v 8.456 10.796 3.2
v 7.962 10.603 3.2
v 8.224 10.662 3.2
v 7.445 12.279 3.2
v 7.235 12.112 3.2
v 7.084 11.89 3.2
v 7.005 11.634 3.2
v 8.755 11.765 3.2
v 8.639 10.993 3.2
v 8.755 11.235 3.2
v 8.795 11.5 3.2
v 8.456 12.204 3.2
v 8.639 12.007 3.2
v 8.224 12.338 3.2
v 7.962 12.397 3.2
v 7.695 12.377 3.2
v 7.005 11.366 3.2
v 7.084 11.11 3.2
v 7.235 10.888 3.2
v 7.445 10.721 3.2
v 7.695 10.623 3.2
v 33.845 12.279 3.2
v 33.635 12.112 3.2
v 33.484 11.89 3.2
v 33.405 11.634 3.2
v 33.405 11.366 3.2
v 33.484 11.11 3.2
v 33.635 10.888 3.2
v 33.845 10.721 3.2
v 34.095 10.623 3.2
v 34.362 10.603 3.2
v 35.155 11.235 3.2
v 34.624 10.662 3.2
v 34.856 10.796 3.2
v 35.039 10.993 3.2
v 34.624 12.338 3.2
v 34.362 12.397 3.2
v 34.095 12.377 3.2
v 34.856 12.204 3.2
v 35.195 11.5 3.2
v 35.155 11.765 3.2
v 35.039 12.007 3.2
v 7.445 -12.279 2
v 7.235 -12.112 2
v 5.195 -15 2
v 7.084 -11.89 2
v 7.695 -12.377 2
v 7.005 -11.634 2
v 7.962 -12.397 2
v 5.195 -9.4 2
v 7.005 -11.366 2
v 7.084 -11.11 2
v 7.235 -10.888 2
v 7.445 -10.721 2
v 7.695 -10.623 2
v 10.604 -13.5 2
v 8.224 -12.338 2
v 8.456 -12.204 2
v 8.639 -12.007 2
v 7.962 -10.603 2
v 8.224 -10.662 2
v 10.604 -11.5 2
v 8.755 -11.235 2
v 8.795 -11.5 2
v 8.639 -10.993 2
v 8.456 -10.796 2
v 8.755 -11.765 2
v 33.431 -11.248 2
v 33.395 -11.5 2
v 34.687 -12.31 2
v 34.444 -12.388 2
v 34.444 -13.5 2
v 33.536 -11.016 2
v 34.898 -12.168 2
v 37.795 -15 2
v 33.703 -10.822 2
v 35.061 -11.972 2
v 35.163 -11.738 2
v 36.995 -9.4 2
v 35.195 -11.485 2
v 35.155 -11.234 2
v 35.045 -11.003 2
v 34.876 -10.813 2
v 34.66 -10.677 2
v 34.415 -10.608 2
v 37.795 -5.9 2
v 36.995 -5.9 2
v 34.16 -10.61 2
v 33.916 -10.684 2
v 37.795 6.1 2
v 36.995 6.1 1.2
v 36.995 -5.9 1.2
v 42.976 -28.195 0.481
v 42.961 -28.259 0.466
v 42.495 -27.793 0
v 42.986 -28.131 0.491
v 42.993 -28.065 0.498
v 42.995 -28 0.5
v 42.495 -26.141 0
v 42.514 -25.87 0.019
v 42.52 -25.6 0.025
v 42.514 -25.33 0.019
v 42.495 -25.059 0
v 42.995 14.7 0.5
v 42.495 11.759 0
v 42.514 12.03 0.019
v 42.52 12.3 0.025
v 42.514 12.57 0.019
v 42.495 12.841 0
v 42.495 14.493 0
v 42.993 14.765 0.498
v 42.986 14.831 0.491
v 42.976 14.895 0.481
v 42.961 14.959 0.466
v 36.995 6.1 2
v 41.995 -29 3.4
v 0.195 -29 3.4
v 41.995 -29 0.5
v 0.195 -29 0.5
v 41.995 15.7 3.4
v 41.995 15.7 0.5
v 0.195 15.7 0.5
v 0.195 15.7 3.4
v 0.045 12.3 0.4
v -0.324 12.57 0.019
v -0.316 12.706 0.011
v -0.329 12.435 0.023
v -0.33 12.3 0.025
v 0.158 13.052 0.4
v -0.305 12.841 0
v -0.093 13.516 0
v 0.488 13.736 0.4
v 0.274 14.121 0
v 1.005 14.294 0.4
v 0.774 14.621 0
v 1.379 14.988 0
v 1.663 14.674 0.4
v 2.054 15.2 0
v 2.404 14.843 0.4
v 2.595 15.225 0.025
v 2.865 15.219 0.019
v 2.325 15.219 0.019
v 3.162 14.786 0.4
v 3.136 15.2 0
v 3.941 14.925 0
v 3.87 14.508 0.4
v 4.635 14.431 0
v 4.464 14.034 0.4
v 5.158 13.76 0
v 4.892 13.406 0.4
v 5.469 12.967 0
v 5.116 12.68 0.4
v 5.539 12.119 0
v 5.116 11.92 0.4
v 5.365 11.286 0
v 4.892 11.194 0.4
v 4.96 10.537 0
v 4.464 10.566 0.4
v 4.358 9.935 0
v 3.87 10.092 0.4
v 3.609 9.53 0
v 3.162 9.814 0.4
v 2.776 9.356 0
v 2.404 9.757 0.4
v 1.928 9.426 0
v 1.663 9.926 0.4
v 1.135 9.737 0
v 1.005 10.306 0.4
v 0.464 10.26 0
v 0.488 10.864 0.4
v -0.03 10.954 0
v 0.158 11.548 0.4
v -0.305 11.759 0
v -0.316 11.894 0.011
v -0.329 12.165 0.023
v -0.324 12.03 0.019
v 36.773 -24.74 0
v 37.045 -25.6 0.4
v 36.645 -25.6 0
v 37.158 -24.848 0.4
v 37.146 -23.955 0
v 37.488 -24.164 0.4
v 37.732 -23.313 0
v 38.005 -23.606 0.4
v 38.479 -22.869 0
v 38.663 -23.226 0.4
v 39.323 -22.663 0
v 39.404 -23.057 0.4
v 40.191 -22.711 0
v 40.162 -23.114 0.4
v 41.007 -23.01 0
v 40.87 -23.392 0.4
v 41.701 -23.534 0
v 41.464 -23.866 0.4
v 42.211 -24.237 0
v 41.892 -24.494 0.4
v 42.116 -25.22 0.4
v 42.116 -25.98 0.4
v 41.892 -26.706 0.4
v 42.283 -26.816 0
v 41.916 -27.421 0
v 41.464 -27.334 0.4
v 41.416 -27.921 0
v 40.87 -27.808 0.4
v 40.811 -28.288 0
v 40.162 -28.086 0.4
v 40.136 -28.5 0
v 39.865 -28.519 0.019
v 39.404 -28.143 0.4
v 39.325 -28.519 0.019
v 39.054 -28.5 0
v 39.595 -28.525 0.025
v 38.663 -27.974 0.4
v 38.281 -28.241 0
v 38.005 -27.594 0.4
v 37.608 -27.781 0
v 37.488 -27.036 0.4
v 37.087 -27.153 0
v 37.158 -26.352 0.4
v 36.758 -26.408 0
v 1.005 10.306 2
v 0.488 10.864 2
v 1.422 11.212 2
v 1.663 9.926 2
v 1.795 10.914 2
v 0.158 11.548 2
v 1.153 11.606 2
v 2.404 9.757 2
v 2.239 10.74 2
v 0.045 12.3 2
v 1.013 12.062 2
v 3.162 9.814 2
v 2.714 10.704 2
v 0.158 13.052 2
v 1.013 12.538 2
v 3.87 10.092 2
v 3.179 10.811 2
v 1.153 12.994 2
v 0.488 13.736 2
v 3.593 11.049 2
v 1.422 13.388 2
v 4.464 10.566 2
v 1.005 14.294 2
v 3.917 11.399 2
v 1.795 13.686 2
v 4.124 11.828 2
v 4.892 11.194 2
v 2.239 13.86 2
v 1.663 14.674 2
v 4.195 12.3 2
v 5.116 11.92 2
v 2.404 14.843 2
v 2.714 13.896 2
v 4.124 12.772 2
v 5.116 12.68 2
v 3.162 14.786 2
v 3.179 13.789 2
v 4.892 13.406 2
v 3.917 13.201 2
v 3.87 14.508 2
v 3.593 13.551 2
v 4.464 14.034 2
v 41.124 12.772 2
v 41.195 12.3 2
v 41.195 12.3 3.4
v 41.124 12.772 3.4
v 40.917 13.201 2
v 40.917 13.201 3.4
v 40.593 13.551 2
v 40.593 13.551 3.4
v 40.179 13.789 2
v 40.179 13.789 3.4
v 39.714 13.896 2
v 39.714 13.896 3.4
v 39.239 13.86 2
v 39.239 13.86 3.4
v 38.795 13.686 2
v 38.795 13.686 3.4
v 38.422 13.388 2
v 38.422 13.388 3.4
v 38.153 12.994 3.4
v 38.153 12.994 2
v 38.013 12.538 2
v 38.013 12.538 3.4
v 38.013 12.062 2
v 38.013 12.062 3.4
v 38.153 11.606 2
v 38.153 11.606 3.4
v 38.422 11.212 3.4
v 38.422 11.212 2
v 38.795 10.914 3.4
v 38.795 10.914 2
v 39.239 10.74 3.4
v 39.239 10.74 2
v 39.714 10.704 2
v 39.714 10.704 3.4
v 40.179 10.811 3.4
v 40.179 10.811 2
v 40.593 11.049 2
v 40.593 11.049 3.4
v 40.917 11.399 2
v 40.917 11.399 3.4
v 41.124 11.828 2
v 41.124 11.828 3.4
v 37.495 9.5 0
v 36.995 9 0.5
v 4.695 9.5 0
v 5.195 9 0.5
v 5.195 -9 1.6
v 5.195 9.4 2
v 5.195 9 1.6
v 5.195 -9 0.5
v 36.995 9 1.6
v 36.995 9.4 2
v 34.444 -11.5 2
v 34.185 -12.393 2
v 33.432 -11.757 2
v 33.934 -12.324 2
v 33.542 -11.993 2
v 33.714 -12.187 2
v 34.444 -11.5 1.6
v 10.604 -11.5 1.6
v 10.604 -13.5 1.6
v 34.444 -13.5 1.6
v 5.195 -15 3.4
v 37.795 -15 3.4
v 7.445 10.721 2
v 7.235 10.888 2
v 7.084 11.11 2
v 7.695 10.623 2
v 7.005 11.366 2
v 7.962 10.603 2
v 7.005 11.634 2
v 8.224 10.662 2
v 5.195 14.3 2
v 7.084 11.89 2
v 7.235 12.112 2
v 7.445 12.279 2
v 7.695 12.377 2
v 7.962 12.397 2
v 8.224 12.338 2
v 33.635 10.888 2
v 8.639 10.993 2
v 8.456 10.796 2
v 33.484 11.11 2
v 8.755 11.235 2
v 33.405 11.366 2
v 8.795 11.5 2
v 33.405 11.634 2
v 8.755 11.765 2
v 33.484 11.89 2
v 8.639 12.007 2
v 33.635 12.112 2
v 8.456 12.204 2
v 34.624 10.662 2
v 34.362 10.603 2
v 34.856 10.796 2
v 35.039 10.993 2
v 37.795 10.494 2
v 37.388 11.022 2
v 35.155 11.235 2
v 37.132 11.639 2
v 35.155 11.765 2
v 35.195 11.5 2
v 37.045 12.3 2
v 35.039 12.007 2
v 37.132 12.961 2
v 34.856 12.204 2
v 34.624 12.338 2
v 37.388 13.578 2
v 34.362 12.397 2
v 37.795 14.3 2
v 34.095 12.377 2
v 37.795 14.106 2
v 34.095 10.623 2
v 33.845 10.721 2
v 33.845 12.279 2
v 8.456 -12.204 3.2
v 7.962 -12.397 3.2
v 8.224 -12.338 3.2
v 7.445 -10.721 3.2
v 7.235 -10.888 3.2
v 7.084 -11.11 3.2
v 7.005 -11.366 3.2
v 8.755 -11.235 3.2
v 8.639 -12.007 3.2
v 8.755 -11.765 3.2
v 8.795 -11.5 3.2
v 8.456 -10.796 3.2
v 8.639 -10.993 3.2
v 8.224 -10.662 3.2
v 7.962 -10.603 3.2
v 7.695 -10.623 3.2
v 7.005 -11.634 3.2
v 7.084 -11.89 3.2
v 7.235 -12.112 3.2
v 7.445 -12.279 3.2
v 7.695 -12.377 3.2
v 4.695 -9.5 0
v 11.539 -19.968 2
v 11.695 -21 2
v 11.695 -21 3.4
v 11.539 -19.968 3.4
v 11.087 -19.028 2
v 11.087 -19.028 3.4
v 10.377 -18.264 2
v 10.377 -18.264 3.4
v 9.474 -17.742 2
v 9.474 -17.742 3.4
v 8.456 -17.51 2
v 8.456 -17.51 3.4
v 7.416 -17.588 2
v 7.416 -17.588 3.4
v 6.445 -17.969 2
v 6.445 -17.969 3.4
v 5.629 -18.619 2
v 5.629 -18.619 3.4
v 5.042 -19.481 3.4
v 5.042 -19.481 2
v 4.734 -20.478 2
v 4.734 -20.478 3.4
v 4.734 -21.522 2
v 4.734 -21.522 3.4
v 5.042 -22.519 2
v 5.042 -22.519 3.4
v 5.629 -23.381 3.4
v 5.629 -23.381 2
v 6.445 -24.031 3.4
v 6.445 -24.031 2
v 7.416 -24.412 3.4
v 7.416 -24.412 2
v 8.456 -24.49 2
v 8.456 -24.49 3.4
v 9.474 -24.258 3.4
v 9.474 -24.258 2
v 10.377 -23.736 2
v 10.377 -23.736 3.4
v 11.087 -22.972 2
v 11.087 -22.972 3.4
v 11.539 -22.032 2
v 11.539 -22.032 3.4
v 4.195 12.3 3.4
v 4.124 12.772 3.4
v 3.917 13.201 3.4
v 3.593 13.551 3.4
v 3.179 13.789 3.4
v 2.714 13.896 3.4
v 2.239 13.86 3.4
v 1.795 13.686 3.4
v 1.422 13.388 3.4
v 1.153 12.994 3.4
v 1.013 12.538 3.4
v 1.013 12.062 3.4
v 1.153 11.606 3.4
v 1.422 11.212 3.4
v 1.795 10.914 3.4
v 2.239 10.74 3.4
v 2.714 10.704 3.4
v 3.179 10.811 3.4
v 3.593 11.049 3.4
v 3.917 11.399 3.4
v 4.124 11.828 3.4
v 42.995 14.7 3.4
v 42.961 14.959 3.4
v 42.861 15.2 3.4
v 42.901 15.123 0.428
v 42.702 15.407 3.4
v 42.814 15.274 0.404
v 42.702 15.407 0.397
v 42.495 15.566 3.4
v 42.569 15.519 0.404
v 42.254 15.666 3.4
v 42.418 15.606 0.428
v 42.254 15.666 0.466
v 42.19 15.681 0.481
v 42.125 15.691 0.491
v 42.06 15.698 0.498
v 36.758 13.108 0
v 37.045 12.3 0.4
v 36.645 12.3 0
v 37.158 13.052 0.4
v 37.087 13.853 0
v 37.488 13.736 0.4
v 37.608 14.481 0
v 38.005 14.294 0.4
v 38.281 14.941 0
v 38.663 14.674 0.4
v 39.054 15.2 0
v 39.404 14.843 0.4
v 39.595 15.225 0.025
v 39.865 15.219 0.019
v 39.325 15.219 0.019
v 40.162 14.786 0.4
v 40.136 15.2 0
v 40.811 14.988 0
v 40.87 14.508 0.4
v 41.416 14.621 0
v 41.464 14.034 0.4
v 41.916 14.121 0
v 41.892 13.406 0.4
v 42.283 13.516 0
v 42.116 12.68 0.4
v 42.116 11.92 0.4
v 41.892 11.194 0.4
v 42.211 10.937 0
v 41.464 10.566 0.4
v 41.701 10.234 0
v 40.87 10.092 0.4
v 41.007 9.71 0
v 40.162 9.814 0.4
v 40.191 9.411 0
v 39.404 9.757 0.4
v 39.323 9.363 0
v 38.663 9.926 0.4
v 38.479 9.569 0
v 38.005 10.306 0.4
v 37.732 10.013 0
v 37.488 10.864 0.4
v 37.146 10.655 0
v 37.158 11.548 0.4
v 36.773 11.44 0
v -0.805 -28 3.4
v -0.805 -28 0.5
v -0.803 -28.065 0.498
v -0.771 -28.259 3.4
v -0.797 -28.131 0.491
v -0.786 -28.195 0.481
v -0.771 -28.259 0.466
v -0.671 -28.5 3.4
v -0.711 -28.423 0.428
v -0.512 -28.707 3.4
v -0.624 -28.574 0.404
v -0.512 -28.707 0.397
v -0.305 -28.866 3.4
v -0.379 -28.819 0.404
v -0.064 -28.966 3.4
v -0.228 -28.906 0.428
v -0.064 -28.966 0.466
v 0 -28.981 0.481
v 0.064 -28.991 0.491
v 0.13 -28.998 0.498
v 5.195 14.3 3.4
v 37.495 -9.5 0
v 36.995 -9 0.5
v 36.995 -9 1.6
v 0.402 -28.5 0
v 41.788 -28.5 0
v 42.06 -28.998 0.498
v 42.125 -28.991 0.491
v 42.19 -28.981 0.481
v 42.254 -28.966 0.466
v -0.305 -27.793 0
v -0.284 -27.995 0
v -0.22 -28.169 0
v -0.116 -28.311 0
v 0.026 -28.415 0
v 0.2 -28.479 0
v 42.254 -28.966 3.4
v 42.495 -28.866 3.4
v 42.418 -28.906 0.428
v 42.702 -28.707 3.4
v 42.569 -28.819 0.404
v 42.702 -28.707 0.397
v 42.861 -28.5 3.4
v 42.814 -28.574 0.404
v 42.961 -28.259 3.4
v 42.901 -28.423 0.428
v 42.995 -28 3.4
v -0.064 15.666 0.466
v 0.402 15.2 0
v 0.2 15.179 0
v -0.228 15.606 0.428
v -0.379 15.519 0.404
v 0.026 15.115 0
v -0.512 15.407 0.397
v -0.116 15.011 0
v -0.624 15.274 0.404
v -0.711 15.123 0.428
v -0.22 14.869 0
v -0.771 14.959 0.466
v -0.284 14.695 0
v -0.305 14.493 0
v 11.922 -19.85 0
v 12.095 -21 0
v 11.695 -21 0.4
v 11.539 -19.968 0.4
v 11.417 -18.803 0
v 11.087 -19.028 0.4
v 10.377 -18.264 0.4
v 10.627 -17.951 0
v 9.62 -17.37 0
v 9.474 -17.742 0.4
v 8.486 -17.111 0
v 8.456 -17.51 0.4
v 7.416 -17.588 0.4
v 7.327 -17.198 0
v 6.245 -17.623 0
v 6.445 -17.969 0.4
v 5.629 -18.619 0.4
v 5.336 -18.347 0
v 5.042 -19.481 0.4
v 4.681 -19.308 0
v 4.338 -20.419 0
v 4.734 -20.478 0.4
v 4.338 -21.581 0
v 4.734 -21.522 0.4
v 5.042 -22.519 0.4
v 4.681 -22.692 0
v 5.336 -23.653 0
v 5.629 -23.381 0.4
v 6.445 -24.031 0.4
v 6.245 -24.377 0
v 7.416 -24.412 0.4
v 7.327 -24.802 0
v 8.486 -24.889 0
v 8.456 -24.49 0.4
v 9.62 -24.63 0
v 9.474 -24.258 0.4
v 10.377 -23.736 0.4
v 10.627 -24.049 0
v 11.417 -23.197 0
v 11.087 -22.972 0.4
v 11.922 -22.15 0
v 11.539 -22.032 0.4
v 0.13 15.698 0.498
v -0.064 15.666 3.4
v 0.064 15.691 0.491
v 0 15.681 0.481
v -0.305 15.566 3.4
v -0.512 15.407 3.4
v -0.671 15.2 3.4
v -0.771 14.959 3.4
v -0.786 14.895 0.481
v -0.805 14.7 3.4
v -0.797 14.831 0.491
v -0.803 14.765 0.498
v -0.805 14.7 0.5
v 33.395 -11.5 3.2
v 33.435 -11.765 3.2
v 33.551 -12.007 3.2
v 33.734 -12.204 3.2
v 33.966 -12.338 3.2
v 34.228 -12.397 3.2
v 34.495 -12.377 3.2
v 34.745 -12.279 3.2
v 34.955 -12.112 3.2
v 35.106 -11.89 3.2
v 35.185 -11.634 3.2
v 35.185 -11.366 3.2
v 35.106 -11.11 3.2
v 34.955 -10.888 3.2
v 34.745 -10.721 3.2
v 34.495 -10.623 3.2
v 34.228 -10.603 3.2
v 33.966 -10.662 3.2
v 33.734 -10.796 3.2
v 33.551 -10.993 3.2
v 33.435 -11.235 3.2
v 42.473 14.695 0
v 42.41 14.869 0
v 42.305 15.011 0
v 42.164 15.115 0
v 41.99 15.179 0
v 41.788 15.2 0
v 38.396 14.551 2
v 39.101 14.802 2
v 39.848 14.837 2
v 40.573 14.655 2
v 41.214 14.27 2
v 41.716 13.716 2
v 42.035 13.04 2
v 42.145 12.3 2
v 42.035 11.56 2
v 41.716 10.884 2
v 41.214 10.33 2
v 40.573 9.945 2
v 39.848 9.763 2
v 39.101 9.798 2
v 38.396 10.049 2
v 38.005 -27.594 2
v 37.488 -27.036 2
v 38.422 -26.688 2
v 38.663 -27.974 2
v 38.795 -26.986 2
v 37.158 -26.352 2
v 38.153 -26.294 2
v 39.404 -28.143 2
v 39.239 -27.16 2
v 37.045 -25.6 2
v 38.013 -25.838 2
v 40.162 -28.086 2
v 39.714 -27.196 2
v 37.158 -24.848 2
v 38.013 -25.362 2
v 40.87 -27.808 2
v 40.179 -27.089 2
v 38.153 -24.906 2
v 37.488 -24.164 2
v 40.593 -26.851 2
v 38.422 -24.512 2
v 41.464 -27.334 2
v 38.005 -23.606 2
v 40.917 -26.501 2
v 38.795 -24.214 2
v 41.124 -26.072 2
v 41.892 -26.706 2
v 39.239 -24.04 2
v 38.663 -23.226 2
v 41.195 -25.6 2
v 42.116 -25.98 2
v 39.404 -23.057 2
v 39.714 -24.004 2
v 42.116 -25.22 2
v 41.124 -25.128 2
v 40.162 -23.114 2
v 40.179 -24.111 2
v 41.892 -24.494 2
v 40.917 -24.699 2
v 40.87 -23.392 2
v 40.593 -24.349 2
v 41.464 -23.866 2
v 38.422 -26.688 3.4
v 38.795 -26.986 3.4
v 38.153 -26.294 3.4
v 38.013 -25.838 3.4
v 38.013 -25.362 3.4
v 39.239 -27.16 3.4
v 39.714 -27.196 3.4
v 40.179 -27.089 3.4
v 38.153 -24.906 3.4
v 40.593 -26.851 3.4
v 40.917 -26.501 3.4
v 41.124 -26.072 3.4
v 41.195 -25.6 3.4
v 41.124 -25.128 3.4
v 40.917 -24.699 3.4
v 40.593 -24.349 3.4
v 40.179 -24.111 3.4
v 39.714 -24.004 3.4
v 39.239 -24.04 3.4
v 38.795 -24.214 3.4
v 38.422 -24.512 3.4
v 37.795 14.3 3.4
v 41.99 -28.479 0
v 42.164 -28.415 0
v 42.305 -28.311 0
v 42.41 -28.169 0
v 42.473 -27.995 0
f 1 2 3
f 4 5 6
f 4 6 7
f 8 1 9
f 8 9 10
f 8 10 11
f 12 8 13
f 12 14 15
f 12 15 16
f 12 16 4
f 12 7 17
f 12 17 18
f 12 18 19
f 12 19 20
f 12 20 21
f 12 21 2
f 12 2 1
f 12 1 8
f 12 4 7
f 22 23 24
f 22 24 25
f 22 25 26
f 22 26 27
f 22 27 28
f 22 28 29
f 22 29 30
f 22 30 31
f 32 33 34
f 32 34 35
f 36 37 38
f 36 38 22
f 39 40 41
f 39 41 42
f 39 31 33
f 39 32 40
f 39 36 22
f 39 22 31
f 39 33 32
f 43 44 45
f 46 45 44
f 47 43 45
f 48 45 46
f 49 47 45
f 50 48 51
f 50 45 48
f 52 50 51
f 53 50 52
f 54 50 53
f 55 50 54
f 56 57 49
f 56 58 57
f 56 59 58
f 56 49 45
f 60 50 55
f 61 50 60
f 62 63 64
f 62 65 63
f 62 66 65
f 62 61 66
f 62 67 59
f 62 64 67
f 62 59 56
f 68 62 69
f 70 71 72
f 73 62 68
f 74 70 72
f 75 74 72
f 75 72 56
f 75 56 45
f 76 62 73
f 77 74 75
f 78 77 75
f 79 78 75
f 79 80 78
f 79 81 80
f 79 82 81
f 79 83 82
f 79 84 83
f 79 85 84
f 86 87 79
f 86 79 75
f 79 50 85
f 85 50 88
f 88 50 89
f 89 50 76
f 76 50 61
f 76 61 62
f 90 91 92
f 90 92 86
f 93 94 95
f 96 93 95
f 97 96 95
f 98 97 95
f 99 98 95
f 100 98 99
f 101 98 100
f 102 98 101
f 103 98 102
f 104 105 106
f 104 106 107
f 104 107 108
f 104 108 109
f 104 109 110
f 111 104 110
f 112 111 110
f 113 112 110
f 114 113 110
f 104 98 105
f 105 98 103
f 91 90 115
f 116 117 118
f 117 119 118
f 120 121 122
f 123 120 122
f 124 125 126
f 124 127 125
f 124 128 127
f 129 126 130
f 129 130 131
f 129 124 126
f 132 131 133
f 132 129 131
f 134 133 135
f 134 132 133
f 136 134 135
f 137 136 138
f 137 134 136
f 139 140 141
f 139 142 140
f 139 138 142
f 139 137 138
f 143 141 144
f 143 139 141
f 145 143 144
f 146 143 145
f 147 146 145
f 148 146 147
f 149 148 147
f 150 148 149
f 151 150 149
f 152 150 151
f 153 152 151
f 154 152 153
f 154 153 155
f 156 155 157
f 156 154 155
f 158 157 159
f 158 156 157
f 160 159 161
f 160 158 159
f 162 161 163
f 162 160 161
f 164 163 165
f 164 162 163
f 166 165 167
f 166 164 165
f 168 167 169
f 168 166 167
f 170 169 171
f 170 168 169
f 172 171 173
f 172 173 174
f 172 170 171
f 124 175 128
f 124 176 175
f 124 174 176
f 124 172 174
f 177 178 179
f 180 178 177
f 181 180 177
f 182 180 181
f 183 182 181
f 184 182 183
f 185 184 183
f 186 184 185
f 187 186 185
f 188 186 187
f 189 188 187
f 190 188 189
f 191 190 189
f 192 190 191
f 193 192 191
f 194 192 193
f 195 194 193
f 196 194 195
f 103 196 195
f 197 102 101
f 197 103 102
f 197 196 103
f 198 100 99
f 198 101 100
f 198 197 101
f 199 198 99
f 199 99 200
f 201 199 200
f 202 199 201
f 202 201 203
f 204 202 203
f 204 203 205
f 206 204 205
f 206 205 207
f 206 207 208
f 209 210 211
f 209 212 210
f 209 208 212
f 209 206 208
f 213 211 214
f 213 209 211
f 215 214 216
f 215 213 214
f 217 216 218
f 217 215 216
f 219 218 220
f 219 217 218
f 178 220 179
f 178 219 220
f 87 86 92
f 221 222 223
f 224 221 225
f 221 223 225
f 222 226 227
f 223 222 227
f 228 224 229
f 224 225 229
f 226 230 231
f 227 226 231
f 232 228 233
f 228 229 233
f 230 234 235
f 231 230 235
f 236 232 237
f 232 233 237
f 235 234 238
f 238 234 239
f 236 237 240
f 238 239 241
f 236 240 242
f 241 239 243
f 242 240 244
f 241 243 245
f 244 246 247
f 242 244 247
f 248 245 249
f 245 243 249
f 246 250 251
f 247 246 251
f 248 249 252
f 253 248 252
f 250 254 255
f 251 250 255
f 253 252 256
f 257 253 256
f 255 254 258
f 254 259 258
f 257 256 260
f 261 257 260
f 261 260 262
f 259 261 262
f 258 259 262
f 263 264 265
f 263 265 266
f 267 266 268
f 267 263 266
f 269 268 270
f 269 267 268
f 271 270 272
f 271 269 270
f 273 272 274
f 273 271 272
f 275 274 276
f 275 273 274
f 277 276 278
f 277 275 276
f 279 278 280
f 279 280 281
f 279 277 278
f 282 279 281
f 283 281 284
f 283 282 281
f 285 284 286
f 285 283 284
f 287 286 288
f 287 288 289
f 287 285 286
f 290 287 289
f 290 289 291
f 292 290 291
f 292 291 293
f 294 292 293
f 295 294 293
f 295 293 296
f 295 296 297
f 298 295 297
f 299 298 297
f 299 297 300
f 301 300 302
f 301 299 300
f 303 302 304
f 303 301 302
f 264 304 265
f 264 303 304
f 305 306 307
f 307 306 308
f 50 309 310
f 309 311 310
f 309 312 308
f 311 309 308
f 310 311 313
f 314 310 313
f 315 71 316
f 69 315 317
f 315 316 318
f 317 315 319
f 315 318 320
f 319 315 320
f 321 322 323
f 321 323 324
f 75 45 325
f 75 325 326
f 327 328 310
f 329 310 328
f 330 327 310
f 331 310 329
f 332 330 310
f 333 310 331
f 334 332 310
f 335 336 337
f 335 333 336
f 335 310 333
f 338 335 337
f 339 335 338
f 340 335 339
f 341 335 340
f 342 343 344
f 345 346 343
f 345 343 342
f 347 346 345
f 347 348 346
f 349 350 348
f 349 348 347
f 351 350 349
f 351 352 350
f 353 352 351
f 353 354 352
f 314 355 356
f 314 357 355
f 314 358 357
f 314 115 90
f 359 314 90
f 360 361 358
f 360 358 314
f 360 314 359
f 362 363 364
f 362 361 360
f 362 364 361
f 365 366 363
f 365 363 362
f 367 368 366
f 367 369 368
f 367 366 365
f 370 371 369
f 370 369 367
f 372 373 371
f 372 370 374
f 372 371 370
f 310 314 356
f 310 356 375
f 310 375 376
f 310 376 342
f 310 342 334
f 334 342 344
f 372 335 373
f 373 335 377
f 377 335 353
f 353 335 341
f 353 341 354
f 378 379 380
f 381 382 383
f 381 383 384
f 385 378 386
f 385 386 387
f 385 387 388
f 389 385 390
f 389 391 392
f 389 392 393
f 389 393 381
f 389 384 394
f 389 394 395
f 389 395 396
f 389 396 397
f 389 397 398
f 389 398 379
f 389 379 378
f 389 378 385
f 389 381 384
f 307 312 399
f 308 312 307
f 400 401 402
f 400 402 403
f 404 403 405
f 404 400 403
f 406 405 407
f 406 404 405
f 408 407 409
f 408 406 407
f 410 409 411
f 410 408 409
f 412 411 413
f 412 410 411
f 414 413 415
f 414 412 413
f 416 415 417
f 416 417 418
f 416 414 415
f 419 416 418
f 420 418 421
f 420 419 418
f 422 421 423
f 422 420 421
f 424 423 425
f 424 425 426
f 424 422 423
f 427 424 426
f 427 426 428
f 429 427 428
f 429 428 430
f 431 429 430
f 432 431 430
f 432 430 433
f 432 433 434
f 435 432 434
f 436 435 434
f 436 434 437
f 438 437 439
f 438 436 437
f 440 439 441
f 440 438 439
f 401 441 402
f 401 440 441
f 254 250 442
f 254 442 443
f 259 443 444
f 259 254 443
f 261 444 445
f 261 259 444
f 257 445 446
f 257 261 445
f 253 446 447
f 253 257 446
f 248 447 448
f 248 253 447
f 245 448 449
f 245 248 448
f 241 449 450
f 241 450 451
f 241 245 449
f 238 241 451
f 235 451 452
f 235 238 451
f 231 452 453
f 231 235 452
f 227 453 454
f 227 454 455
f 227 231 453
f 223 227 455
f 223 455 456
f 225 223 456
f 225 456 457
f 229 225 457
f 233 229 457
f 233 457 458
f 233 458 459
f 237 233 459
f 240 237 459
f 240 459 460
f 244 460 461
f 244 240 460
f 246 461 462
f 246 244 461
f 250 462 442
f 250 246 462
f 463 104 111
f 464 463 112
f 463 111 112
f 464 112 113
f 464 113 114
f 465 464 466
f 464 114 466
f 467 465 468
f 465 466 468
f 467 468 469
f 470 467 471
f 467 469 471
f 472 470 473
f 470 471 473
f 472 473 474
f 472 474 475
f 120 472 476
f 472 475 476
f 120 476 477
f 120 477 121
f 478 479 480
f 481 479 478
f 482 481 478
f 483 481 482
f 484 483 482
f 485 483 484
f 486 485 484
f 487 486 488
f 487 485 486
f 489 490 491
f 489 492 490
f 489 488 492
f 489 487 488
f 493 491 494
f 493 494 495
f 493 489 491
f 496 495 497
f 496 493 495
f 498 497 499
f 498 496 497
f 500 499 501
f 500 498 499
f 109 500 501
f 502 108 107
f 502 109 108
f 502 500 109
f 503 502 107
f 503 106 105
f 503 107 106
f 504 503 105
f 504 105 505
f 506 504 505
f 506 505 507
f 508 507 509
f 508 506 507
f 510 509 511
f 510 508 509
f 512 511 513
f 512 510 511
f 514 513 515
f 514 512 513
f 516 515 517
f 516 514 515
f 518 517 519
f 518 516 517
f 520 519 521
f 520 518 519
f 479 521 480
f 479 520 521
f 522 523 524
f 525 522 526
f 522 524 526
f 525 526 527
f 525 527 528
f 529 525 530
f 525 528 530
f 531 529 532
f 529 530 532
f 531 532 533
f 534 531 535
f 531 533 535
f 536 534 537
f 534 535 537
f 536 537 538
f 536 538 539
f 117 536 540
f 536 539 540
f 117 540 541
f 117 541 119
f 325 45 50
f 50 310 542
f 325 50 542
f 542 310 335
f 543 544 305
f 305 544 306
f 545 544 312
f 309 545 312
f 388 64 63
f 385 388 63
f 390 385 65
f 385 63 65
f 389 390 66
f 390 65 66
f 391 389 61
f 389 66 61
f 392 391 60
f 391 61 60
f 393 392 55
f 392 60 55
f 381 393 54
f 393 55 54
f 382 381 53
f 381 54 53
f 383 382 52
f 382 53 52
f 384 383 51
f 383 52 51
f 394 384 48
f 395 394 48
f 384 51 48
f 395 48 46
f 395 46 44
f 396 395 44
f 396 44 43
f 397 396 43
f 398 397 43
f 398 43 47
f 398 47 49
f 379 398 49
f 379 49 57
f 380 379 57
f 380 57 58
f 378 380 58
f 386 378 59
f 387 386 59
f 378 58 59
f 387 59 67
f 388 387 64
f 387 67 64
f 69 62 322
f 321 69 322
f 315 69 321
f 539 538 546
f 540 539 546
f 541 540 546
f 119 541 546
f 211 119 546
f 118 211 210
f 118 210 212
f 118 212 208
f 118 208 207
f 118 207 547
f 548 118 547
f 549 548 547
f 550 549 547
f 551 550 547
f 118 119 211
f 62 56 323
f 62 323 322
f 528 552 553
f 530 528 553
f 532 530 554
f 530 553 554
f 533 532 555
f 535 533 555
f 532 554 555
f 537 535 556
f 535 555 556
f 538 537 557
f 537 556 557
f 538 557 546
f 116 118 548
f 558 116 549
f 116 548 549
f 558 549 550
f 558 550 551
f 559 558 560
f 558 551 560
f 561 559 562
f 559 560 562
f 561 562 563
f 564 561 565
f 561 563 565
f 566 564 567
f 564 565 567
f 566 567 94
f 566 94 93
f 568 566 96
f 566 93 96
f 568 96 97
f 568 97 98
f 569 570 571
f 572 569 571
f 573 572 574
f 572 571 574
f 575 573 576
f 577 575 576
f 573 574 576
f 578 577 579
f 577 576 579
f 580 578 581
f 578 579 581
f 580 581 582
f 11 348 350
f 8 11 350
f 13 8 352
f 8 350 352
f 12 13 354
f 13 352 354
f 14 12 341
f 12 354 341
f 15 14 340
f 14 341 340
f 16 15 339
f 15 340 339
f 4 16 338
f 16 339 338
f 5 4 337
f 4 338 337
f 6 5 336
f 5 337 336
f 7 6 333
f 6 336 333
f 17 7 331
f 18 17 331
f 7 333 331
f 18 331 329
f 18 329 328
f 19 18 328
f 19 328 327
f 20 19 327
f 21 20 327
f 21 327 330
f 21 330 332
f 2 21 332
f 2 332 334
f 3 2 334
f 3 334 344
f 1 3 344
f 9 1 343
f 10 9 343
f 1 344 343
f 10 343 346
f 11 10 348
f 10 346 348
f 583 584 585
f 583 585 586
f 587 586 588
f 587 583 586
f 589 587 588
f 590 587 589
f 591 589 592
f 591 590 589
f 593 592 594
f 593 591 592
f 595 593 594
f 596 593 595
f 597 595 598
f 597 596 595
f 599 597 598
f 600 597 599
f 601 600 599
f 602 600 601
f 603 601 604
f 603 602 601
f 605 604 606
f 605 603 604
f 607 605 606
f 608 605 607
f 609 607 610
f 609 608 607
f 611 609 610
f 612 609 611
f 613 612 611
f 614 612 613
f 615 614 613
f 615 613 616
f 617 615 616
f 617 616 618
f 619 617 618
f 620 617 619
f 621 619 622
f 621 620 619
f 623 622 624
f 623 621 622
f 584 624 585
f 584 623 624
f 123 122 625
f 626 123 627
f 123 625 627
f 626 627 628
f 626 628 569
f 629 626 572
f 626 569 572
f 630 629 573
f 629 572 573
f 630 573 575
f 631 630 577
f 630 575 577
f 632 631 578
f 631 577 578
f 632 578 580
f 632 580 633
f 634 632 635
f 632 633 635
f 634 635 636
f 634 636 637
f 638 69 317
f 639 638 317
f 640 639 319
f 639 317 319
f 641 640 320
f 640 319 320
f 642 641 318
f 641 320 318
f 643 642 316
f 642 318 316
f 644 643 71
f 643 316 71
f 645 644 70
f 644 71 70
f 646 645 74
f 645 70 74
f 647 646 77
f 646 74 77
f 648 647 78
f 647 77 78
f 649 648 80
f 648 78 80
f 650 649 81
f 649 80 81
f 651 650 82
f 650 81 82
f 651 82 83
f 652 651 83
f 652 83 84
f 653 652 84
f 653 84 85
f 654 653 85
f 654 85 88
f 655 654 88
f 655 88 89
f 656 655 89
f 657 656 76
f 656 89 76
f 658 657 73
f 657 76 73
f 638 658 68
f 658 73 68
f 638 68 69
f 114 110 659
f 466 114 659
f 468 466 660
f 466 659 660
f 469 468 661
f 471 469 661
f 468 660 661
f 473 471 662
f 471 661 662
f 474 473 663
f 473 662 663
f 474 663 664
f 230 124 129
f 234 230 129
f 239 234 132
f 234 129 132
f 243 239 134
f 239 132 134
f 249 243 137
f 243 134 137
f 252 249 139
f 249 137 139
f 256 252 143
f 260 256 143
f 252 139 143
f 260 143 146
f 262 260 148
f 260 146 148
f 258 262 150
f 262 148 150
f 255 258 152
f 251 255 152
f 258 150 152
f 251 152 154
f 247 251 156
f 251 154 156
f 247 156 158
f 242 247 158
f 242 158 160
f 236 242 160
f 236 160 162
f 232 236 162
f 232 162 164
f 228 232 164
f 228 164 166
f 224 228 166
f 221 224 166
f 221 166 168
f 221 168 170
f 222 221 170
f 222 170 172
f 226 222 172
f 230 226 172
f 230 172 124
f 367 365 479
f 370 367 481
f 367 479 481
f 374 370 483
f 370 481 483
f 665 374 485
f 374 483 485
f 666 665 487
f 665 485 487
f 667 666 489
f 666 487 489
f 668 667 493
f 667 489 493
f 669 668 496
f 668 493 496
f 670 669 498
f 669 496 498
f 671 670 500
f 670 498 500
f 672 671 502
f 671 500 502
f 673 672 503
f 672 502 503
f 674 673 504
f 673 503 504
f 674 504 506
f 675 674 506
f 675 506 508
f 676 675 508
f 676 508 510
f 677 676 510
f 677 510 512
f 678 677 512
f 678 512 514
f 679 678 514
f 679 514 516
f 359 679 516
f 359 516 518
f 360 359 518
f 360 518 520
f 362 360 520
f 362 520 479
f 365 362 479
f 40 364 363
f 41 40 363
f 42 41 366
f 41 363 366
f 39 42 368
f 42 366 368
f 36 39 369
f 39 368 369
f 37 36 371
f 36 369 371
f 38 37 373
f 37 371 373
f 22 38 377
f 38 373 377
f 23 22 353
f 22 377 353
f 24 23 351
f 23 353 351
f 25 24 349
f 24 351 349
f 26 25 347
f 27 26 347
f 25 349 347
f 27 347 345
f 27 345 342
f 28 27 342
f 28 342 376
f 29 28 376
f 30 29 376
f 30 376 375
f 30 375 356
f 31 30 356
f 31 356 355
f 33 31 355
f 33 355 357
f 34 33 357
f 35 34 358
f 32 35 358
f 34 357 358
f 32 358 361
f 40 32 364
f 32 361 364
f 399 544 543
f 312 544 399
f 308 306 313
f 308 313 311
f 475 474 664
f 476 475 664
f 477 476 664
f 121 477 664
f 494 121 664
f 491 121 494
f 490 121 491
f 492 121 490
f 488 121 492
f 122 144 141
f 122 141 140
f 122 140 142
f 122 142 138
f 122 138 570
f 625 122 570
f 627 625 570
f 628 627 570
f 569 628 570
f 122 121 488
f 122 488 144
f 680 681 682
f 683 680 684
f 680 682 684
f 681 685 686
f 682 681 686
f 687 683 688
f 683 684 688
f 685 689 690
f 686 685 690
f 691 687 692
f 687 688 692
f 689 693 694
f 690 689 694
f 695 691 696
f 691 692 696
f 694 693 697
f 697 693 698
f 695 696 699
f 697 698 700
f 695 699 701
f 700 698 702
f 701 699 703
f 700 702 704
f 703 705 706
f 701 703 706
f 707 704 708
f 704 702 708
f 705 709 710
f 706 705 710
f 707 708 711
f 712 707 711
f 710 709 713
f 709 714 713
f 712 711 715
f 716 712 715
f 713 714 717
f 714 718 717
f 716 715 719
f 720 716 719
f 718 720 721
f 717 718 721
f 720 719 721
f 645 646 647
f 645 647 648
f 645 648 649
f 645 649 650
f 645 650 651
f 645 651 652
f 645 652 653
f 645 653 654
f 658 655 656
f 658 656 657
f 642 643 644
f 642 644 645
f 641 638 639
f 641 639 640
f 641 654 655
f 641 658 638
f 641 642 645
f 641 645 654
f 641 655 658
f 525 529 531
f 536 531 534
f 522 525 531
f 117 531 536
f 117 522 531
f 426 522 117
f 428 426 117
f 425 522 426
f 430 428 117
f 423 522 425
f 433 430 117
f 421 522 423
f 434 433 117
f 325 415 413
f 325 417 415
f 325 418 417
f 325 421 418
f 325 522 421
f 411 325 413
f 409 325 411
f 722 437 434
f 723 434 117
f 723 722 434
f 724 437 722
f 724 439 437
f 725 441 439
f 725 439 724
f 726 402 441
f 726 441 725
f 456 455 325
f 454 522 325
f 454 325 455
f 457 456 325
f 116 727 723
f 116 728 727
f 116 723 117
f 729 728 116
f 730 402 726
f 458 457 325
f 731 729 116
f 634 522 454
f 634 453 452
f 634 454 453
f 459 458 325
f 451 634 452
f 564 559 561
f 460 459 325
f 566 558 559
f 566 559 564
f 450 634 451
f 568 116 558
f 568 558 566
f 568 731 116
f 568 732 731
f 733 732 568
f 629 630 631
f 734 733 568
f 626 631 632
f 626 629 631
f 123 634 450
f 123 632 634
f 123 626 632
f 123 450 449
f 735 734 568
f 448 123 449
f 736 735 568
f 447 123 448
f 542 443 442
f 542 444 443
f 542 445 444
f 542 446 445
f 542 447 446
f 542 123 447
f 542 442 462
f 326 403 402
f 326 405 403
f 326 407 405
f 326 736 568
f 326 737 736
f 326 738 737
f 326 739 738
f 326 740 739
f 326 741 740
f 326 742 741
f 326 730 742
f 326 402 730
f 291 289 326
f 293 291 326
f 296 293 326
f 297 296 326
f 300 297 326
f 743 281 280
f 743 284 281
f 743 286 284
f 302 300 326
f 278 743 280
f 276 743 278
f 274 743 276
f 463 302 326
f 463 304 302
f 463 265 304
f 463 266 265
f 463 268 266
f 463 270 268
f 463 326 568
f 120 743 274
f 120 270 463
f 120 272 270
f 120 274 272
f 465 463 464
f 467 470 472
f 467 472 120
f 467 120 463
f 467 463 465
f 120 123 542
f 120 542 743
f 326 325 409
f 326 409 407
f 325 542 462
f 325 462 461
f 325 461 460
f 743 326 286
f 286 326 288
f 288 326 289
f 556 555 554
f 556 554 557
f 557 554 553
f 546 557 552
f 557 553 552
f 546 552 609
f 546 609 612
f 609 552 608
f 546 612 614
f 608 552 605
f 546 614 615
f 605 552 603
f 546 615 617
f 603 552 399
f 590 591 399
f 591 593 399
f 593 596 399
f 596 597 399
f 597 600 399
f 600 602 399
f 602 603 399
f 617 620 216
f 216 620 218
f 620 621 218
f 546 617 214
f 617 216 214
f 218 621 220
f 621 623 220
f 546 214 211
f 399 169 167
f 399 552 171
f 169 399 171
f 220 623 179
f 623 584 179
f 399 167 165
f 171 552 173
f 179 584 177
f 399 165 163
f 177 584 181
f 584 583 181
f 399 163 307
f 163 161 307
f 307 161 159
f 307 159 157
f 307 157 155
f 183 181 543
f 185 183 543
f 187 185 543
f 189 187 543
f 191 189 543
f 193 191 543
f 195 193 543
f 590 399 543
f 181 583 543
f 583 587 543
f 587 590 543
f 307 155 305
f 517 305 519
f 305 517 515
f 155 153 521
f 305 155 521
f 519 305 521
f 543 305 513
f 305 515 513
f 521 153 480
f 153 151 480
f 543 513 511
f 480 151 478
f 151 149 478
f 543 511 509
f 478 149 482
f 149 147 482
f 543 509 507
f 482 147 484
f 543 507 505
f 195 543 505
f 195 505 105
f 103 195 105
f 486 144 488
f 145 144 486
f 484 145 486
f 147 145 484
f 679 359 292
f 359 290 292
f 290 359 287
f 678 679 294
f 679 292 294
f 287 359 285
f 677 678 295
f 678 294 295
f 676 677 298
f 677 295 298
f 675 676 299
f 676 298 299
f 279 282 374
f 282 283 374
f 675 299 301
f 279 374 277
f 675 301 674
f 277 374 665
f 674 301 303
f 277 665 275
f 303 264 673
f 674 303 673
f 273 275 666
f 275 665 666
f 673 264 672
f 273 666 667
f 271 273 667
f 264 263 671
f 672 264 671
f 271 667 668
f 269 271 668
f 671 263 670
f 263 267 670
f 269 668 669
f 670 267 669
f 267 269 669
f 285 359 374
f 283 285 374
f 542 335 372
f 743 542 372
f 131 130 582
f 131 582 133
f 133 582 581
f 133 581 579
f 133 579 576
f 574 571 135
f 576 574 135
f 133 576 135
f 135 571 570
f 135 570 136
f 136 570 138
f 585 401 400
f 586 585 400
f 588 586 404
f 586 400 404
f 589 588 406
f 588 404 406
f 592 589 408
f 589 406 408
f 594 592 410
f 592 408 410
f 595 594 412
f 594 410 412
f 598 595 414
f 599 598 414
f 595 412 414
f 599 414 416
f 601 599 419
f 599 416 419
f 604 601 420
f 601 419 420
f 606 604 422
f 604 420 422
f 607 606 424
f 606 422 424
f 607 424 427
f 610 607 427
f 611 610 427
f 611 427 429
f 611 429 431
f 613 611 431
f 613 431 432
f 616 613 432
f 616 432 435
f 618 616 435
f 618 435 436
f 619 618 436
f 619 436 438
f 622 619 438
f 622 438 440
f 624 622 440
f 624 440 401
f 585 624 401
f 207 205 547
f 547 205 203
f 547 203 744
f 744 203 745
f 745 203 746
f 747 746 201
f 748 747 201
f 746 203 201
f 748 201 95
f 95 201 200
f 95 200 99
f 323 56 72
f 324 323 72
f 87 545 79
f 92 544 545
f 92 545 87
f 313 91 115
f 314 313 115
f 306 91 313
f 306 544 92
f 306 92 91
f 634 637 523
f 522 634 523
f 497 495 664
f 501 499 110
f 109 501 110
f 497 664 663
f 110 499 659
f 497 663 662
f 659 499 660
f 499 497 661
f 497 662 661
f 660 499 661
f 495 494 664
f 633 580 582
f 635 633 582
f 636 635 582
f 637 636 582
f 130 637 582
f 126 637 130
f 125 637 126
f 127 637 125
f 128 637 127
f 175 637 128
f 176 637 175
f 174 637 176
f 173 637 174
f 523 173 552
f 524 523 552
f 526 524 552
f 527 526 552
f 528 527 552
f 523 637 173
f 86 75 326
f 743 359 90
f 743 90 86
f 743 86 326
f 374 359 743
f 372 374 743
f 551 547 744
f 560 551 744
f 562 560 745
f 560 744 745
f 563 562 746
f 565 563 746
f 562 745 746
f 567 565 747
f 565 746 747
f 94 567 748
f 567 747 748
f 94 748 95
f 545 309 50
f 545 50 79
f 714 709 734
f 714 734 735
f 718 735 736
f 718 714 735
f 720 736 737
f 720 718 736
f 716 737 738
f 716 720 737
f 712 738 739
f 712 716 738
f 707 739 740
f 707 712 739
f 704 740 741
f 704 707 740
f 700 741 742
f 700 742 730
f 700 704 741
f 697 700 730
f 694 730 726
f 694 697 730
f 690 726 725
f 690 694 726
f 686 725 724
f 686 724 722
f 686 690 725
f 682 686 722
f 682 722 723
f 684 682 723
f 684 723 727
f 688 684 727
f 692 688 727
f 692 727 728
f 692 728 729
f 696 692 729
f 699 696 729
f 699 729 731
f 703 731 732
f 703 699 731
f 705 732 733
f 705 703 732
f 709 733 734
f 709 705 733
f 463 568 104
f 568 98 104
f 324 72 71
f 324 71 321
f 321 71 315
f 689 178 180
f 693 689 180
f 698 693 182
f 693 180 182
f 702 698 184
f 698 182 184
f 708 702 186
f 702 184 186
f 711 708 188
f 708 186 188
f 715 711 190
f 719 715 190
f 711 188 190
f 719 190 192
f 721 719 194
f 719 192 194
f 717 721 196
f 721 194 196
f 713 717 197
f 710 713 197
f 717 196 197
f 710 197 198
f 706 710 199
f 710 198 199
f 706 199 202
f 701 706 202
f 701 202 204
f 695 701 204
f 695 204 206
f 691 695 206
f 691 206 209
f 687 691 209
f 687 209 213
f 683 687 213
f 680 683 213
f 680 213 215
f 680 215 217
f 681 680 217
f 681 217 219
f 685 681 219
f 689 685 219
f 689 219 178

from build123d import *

# Parameters (mm, degrees)
EXTRUDE_1_DEPTH          = 2
SKETCH_17_W              = 31.8
SKETCH_17_H              = 18
CUT_EXTRUDE_1_DEPTH      = 10
CHAMFER_1_SIZE           = 0.5
CHAMFER_3_SIZE           = 0.5
SKETCH_25_W              = 23.840125732
SKETCH_25_H              = 2
CUT_EXTRUDE_5_DEPTH      = 0.4
CUT_EXTRUDE_6_DEPTH      = 6
CUT_EXTRUDE_6_DEPTH_BACK = 6
SKETCH_28_R              = 0.9
EXTRUDE_3_DEPTH          = 1.2
CHAMFER_6_SIZE           = 0.4
SKETCH_29_R              = 1.6
CUT_EXTRUDE_7_DEPTH      = 3.2
SKETCH_30_R              = 3.5
CUT_EXTRUDE_8_DEPTH      = 10
CHAMFER_9_SIZE           = 0.4
FILLET_1_R               = 1
SKETCH_31_R              = 2.55
CUT_EXTRUDE_9_DEPTH      = 2
CHAMFER_10_SIZE          = 0.4
SKETCH_32_R              = 3.5
SKETCH_32_R_2            = 1.6
SKETCH_32_W              = 32.6
SKETCH_32_H              = 29.3
EXTRUDE_5_DEPTH          = 1.4


with BuildPart() as part:
    # Эскиз1 → Бобышка-Вытянуть1 (new body)
    with BuildSketch(Plane.XY):
        Polygon((42.994929839, 15.7), (0.265604814, 15.7), (-0.805070161, 15.7), (-0.805070161, -3.225667373), (-0.805070161, -27.24226554), (-0.805070161, -29), (41.213218599, -29), (42.994929839, -29), (42.994929839, 0), align=None)
    extrude(amount=EXTRUDE_1_DEPTH)

    # Эскиз17 → Вырез-Вытянуть1 (cut)
    with BuildSketch(Plane(origin=(0, 0, 0), x_dir=(-1, 0, 0), z_dir=(0, 0, -1))):
        with Locations((-21.094929839, 0)):
            Rectangle(SKETCH_17_W, SKETCH_17_H)
    extrude(amount=-CUT_EXTRUDE_1_DEPTH, mode=Mode.SUBTRACT)

    # Фаска1
    chamfer_1_edges = [part.edges().sort_by_distance(p)[0] for p in [
        (36.994929839, 0, 0),
        (21.094929839, -9, 0),
        (5.194929839, 0, 0),
        (21.094929839, 9, 0),
    ]]
    chamfer(chamfer_1_edges, length=CHAMFER_1_SIZE)

    # Фаска3
    chamfer_3_edges = [part.edges().sort_by_distance(p)[0] for p in [
        (21.094929839, 15.7, 0),
        (42.994929839, -6.65, 0),
        (21.094929839, -29, 0),
        (-0.805070161, -6.65, 0),
    ]]
    chamfer(chamfer_3_edges, length=CHAMFER_3_SIZE)

    # Эскиз25 → Вырез-Вытянуть5 (cut)
    with BuildSketch(Plane.XY.offset(2)):
        with Locations((22.524068439, -12.5)):
            Rectangle(SKETCH_25_W, SKETCH_25_H)
    extrude(amount=-CUT_EXTRUDE_5_DEPTH, mode=Mode.SUBTRACT)

    # Эскиз27 → Вырез-Вытянуть6 (cut, two sides: drawn at the far end of the back side and taken through both)
    with BuildSketch(Plane(origin=(0, 0.1, 0), x_dir=(-1, 0, 0), z_dir=(0, -1, 0)).offset(-CUT_EXTRUDE_6_DEPTH_BACK)):
        Polygon((-36.994929839, -2), (-36.994929839, -1.2), (-37.794929839, -2), align=None)
    extrude(amount=CUT_EXTRUDE_6_DEPTH + CUT_EXTRUDE_6_DEPTH_BACK, mode=Mode.SUBTRACT)

    # Эскиз28 → Бобышка-Вытянуть3 (add)
    with BuildSketch(Plane.XY.offset(2)):
        with Locations((7.894929839, 11.5)):
            Circle(SKETCH_28_R)
        with Locations((34.294929839, 11.5)):
            Circle(SKETCH_28_R)
        with Locations(Location((34.294929839, -11.5, 0), (0, 0, 180))):
            Circle(SKETCH_28_R)
        with Locations((7.894929839, -11.5)):
            Circle(SKETCH_28_R)
    extrude(amount=EXTRUDE_3_DEPTH)

    # Фаска6
    chamfer_6_edges = [part.edges().sort_by_distance(p)[0] for p in [
        (21.094929839, 9, 2),
        (21.094929839, -9, 2),
    ]]
    chamfer(chamfer_6_edges, length=CHAMFER_6_SIZE)

    # Эскиз29 → Вырез-Вытянуть7 (cut)
    with BuildSketch(Plane.XY.offset(2)):
        with Locations((2.594929839, 12.3)):
            Circle(SKETCH_29_R)
        with Locations((39.594929839, 12.3)):
            Circle(SKETCH_29_R)
        with Locations((39.594929839, -25.6)):
            Circle(SKETCH_29_R)
    extrude(amount=-CUT_EXTRUDE_7_DEPTH, mode=Mode.SUBTRACT)

    # Эскиз30 → Вырез-Вытянуть8 (cut)
    with BuildSketch(Plane.XY.offset(2)):
        with Locations((8.194929839, -21)):
            Circle(SKETCH_30_R)
    extrude(amount=-CUT_EXTRUDE_8_DEPTH, mode=Mode.SUBTRACT)

    # Фаска9
    chamfer_9_edges = [part.edges().sort_by_distance(p)[0] for p in [
        (4.694929839, -21, 0),
    ]]
    chamfer(chamfer_9_edges, length=CHAMFER_9_SIZE)

    # Скругление1
    # the kernel refuses this fillet: 1 mm, written as the material it takes off along each edge
    with BuildSketch(Plane(origin=(42.994929839, -29, -2), x_dir=(0, 1, 0), z_dir=(0, 0, 1)), Plane(origin=(42.994929839, 15.7, -2), x_dir=(-1, 0, 0), z_dir=(0, 0, 1))) as fillet_1_piece_1:
        with BuildLine():
            CenterArc((FILLET_1_R, FILLET_1_R), FILLET_1_R, 180, 90)
            Line((0, FILLET_1_R), (0, 0))
            Line((0, 0), (FILLET_1_R, 0))
        make_face()
    extrude(amount=6.5, mode=Mode.SUBTRACT)
    with BuildSketch(Plane(origin=(-0.805070161, -29, -2), x_dir=(0, 1, 0), z_dir=(0, 0, 1)), Plane(origin=(-0.805070161, 15.7, -2), x_dir=(1, 0, 0), z_dir=(0, 0, 1))) as fillet_1_piece_2:
        with BuildLine():
            CenterArc((FILLET_1_R, -FILLET_1_R), FILLET_1_R, 90, 90)
            Line((0, -FILLET_1_R), (0, 0))
            Line((0, 0), (FILLET_1_R, 0))
        make_face()
    extrude(amount=6.5, mode=Mode.SUBTRACT)
    with BuildSketch(Plane(origin=(0.528263172, 14.366666667, -0.833333333), x_dir=(0.816496580927726, 0.4082482904638629, 0.4082482904638631), z_dir=(-0.5773502691896258, 0.5773502691896258, 0.5773502691896258)), Plane(origin=(0.528263172, -27.666666667, -0.833333333), x_dir=(-0.4082482904638631, 0.8164965809277261, 0.4082482904638631), z_dir=(-0.5773502691896258, -0.5773502691896258, 0.5773502691896258))) as fillet_1_piece_3:
        with BuildLine():
            CenterArc((FILLET_1_R * 0.57735026919, -FILLET_1_R), FILLET_1_R, 90, 60)
            Line((-FILLET_1_R * 0.288675134595, -FILLET_1_R * 0.5), (0, 0))
            Line((0, 0), (FILLET_1_R * 0.57735026919, 0))
        make_face()
    extrude(amount=3.75277675, mode=Mode.SUBTRACT)
    with BuildSketch(Plane(origin=(41.661596505, 14.366666667, -0.833333333), x_dir=(-0.8164965809277261, 0.4082482904638622, 0.4082482904638635), z_dir=(0.5773502691896256, 0.577350269189626, 0.577350269189626)), Plane(origin=(41.661596505, -27.666666667, -0.833333333), x_dir=(0.4082482904638636, 0.8164965809277261, 0.40824829046386224), z_dir=(0.5773502691896261, -0.5773502691896256, 0.5773502691896256))) as fillet_1_piece_4:
        with BuildLine():
            CenterArc((FILLET_1_R * 0.57735026919, FILLET_1_R), FILLET_1_R, 210, 60)
            Line((-FILLET_1_R * 0.288675134595, FILLET_1_R * 0.5), (0, 0))
            Line((0, 0), (FILLET_1_R * 0.57735026919, 0))
        make_face()
    extrude(amount=3.75277675, mode=Mode.SUBTRACT)

    # Эскиз31 → Вырез-Вытянуть9 (cut)
    with BuildSketch(Plane(origin=(0, 0, 0), x_dir=(-1, 0, 0), z_dir=(0, 0, -1))):
        with Locations((-39.594929839, 12.3)):
            Circle(SKETCH_31_R)
        with Locations((-2.594929839, 12.3)):
            Circle(SKETCH_31_R)
        with Locations((-39.594929839, -25.6)):
            Circle(SKETCH_31_R)
    extrude(amount=-CUT_EXTRUDE_9_DEPTH, mode=Mode.SUBTRACT)

    # Фаска10
    # the kernel refuses this chamfer: 0.4 mm, written as the material it takes off along each edge
    with BuildSketch(Plane(origin=(39.594929839, -25.6, 0), x_dir=(-1, 0, 0), z_dir=(0, -1, 0))) as chamfer_10_piece_1:
        Polygon((2.55 + CHAMFER_10_SIZE, 0), (2.55, -CHAMFER_10_SIZE), (2.55, 0), align=None)
    revolve(axis=Axis((39.594929839, -25.6, 0), (0, 0, -1)), mode=Mode.SUBTRACT)
    with BuildSketch(Plane(origin=(2.594929839, 12.3, 0), x_dir=(-1, 0, 0), z_dir=(0, -1, 0))) as chamfer_10_piece_2:
        Polygon((2.55 + CHAMFER_10_SIZE, 0), (2.55, -CHAMFER_10_SIZE), (2.55, 0), align=None)
    revolve(axis=Axis((2.594929839, 12.3, 0), (0, 0, -1)), mode=Mode.SUBTRACT)
    with BuildSketch(Plane(origin=(39.594929839, 12.3, 0), x_dir=(-1, 0, 0), z_dir=(0, -1, 0))) as chamfer_10_piece_3:
        Polygon((2.55 + CHAMFER_10_SIZE, 0), (2.55, -CHAMFER_10_SIZE), (2.55, 0), align=None)
    revolve(axis=Axis((39.594929839, 12.3, 0), (0, 0, -1)), mode=Mode.SUBTRACT)

    # Эскиз32 → Бобышка-Вытянуть5 (add)
    with BuildSketch(Plane.XY.offset(2)):
        with BuildLine():
            Line((-0.805070161, 14.7), (-0.805070161, -28))
            ThreePointArc((-0.805070161, -28), (-0.512176942, -28.707106781), (0.194929839, -29))
            Line((0.194929839, -29), (41.994929839, -29))
            ThreePointArc((41.994929839, -29), (42.70203662, -28.707106781), (42.994929839, -28))
            Line((42.994929839, -28), (42.994929839, 14.7))
            ThreePointArc((42.994929839, 14.7), (42.70203662, 15.407106781), (41.994929839, 15.7))
            Line((41.994929839, 15.7), (0.194929839, 15.7))
            ThreePointArc((0.194929839, 15.7), (-0.512176942, 15.407106781), (-0.805070161, 14.7))
        make_face()
        with Locations((8.194929839, -21)):
            Circle(SKETCH_32_R, mode=Mode.SUBTRACT)
        with Locations((39.594929839, -25.6)):
            Circle(SKETCH_32_R_2, mode=Mode.SUBTRACT)
        with Locations((39.594929839, 12.3)):
            Circle(SKETCH_32_R_2, mode=Mode.SUBTRACT)
        with Locations((2.594929839, 12.3)):
            Circle(SKETCH_32_R_2, mode=Mode.SUBTRACT)
        with Locations((21.494929839, -0.35)):
            Rectangle(SKETCH_32_W, SKETCH_32_H, mode=Mode.SUBTRACT)
    extrude(amount=EXTRUDE_5_DEPTH)


solid = part.part
